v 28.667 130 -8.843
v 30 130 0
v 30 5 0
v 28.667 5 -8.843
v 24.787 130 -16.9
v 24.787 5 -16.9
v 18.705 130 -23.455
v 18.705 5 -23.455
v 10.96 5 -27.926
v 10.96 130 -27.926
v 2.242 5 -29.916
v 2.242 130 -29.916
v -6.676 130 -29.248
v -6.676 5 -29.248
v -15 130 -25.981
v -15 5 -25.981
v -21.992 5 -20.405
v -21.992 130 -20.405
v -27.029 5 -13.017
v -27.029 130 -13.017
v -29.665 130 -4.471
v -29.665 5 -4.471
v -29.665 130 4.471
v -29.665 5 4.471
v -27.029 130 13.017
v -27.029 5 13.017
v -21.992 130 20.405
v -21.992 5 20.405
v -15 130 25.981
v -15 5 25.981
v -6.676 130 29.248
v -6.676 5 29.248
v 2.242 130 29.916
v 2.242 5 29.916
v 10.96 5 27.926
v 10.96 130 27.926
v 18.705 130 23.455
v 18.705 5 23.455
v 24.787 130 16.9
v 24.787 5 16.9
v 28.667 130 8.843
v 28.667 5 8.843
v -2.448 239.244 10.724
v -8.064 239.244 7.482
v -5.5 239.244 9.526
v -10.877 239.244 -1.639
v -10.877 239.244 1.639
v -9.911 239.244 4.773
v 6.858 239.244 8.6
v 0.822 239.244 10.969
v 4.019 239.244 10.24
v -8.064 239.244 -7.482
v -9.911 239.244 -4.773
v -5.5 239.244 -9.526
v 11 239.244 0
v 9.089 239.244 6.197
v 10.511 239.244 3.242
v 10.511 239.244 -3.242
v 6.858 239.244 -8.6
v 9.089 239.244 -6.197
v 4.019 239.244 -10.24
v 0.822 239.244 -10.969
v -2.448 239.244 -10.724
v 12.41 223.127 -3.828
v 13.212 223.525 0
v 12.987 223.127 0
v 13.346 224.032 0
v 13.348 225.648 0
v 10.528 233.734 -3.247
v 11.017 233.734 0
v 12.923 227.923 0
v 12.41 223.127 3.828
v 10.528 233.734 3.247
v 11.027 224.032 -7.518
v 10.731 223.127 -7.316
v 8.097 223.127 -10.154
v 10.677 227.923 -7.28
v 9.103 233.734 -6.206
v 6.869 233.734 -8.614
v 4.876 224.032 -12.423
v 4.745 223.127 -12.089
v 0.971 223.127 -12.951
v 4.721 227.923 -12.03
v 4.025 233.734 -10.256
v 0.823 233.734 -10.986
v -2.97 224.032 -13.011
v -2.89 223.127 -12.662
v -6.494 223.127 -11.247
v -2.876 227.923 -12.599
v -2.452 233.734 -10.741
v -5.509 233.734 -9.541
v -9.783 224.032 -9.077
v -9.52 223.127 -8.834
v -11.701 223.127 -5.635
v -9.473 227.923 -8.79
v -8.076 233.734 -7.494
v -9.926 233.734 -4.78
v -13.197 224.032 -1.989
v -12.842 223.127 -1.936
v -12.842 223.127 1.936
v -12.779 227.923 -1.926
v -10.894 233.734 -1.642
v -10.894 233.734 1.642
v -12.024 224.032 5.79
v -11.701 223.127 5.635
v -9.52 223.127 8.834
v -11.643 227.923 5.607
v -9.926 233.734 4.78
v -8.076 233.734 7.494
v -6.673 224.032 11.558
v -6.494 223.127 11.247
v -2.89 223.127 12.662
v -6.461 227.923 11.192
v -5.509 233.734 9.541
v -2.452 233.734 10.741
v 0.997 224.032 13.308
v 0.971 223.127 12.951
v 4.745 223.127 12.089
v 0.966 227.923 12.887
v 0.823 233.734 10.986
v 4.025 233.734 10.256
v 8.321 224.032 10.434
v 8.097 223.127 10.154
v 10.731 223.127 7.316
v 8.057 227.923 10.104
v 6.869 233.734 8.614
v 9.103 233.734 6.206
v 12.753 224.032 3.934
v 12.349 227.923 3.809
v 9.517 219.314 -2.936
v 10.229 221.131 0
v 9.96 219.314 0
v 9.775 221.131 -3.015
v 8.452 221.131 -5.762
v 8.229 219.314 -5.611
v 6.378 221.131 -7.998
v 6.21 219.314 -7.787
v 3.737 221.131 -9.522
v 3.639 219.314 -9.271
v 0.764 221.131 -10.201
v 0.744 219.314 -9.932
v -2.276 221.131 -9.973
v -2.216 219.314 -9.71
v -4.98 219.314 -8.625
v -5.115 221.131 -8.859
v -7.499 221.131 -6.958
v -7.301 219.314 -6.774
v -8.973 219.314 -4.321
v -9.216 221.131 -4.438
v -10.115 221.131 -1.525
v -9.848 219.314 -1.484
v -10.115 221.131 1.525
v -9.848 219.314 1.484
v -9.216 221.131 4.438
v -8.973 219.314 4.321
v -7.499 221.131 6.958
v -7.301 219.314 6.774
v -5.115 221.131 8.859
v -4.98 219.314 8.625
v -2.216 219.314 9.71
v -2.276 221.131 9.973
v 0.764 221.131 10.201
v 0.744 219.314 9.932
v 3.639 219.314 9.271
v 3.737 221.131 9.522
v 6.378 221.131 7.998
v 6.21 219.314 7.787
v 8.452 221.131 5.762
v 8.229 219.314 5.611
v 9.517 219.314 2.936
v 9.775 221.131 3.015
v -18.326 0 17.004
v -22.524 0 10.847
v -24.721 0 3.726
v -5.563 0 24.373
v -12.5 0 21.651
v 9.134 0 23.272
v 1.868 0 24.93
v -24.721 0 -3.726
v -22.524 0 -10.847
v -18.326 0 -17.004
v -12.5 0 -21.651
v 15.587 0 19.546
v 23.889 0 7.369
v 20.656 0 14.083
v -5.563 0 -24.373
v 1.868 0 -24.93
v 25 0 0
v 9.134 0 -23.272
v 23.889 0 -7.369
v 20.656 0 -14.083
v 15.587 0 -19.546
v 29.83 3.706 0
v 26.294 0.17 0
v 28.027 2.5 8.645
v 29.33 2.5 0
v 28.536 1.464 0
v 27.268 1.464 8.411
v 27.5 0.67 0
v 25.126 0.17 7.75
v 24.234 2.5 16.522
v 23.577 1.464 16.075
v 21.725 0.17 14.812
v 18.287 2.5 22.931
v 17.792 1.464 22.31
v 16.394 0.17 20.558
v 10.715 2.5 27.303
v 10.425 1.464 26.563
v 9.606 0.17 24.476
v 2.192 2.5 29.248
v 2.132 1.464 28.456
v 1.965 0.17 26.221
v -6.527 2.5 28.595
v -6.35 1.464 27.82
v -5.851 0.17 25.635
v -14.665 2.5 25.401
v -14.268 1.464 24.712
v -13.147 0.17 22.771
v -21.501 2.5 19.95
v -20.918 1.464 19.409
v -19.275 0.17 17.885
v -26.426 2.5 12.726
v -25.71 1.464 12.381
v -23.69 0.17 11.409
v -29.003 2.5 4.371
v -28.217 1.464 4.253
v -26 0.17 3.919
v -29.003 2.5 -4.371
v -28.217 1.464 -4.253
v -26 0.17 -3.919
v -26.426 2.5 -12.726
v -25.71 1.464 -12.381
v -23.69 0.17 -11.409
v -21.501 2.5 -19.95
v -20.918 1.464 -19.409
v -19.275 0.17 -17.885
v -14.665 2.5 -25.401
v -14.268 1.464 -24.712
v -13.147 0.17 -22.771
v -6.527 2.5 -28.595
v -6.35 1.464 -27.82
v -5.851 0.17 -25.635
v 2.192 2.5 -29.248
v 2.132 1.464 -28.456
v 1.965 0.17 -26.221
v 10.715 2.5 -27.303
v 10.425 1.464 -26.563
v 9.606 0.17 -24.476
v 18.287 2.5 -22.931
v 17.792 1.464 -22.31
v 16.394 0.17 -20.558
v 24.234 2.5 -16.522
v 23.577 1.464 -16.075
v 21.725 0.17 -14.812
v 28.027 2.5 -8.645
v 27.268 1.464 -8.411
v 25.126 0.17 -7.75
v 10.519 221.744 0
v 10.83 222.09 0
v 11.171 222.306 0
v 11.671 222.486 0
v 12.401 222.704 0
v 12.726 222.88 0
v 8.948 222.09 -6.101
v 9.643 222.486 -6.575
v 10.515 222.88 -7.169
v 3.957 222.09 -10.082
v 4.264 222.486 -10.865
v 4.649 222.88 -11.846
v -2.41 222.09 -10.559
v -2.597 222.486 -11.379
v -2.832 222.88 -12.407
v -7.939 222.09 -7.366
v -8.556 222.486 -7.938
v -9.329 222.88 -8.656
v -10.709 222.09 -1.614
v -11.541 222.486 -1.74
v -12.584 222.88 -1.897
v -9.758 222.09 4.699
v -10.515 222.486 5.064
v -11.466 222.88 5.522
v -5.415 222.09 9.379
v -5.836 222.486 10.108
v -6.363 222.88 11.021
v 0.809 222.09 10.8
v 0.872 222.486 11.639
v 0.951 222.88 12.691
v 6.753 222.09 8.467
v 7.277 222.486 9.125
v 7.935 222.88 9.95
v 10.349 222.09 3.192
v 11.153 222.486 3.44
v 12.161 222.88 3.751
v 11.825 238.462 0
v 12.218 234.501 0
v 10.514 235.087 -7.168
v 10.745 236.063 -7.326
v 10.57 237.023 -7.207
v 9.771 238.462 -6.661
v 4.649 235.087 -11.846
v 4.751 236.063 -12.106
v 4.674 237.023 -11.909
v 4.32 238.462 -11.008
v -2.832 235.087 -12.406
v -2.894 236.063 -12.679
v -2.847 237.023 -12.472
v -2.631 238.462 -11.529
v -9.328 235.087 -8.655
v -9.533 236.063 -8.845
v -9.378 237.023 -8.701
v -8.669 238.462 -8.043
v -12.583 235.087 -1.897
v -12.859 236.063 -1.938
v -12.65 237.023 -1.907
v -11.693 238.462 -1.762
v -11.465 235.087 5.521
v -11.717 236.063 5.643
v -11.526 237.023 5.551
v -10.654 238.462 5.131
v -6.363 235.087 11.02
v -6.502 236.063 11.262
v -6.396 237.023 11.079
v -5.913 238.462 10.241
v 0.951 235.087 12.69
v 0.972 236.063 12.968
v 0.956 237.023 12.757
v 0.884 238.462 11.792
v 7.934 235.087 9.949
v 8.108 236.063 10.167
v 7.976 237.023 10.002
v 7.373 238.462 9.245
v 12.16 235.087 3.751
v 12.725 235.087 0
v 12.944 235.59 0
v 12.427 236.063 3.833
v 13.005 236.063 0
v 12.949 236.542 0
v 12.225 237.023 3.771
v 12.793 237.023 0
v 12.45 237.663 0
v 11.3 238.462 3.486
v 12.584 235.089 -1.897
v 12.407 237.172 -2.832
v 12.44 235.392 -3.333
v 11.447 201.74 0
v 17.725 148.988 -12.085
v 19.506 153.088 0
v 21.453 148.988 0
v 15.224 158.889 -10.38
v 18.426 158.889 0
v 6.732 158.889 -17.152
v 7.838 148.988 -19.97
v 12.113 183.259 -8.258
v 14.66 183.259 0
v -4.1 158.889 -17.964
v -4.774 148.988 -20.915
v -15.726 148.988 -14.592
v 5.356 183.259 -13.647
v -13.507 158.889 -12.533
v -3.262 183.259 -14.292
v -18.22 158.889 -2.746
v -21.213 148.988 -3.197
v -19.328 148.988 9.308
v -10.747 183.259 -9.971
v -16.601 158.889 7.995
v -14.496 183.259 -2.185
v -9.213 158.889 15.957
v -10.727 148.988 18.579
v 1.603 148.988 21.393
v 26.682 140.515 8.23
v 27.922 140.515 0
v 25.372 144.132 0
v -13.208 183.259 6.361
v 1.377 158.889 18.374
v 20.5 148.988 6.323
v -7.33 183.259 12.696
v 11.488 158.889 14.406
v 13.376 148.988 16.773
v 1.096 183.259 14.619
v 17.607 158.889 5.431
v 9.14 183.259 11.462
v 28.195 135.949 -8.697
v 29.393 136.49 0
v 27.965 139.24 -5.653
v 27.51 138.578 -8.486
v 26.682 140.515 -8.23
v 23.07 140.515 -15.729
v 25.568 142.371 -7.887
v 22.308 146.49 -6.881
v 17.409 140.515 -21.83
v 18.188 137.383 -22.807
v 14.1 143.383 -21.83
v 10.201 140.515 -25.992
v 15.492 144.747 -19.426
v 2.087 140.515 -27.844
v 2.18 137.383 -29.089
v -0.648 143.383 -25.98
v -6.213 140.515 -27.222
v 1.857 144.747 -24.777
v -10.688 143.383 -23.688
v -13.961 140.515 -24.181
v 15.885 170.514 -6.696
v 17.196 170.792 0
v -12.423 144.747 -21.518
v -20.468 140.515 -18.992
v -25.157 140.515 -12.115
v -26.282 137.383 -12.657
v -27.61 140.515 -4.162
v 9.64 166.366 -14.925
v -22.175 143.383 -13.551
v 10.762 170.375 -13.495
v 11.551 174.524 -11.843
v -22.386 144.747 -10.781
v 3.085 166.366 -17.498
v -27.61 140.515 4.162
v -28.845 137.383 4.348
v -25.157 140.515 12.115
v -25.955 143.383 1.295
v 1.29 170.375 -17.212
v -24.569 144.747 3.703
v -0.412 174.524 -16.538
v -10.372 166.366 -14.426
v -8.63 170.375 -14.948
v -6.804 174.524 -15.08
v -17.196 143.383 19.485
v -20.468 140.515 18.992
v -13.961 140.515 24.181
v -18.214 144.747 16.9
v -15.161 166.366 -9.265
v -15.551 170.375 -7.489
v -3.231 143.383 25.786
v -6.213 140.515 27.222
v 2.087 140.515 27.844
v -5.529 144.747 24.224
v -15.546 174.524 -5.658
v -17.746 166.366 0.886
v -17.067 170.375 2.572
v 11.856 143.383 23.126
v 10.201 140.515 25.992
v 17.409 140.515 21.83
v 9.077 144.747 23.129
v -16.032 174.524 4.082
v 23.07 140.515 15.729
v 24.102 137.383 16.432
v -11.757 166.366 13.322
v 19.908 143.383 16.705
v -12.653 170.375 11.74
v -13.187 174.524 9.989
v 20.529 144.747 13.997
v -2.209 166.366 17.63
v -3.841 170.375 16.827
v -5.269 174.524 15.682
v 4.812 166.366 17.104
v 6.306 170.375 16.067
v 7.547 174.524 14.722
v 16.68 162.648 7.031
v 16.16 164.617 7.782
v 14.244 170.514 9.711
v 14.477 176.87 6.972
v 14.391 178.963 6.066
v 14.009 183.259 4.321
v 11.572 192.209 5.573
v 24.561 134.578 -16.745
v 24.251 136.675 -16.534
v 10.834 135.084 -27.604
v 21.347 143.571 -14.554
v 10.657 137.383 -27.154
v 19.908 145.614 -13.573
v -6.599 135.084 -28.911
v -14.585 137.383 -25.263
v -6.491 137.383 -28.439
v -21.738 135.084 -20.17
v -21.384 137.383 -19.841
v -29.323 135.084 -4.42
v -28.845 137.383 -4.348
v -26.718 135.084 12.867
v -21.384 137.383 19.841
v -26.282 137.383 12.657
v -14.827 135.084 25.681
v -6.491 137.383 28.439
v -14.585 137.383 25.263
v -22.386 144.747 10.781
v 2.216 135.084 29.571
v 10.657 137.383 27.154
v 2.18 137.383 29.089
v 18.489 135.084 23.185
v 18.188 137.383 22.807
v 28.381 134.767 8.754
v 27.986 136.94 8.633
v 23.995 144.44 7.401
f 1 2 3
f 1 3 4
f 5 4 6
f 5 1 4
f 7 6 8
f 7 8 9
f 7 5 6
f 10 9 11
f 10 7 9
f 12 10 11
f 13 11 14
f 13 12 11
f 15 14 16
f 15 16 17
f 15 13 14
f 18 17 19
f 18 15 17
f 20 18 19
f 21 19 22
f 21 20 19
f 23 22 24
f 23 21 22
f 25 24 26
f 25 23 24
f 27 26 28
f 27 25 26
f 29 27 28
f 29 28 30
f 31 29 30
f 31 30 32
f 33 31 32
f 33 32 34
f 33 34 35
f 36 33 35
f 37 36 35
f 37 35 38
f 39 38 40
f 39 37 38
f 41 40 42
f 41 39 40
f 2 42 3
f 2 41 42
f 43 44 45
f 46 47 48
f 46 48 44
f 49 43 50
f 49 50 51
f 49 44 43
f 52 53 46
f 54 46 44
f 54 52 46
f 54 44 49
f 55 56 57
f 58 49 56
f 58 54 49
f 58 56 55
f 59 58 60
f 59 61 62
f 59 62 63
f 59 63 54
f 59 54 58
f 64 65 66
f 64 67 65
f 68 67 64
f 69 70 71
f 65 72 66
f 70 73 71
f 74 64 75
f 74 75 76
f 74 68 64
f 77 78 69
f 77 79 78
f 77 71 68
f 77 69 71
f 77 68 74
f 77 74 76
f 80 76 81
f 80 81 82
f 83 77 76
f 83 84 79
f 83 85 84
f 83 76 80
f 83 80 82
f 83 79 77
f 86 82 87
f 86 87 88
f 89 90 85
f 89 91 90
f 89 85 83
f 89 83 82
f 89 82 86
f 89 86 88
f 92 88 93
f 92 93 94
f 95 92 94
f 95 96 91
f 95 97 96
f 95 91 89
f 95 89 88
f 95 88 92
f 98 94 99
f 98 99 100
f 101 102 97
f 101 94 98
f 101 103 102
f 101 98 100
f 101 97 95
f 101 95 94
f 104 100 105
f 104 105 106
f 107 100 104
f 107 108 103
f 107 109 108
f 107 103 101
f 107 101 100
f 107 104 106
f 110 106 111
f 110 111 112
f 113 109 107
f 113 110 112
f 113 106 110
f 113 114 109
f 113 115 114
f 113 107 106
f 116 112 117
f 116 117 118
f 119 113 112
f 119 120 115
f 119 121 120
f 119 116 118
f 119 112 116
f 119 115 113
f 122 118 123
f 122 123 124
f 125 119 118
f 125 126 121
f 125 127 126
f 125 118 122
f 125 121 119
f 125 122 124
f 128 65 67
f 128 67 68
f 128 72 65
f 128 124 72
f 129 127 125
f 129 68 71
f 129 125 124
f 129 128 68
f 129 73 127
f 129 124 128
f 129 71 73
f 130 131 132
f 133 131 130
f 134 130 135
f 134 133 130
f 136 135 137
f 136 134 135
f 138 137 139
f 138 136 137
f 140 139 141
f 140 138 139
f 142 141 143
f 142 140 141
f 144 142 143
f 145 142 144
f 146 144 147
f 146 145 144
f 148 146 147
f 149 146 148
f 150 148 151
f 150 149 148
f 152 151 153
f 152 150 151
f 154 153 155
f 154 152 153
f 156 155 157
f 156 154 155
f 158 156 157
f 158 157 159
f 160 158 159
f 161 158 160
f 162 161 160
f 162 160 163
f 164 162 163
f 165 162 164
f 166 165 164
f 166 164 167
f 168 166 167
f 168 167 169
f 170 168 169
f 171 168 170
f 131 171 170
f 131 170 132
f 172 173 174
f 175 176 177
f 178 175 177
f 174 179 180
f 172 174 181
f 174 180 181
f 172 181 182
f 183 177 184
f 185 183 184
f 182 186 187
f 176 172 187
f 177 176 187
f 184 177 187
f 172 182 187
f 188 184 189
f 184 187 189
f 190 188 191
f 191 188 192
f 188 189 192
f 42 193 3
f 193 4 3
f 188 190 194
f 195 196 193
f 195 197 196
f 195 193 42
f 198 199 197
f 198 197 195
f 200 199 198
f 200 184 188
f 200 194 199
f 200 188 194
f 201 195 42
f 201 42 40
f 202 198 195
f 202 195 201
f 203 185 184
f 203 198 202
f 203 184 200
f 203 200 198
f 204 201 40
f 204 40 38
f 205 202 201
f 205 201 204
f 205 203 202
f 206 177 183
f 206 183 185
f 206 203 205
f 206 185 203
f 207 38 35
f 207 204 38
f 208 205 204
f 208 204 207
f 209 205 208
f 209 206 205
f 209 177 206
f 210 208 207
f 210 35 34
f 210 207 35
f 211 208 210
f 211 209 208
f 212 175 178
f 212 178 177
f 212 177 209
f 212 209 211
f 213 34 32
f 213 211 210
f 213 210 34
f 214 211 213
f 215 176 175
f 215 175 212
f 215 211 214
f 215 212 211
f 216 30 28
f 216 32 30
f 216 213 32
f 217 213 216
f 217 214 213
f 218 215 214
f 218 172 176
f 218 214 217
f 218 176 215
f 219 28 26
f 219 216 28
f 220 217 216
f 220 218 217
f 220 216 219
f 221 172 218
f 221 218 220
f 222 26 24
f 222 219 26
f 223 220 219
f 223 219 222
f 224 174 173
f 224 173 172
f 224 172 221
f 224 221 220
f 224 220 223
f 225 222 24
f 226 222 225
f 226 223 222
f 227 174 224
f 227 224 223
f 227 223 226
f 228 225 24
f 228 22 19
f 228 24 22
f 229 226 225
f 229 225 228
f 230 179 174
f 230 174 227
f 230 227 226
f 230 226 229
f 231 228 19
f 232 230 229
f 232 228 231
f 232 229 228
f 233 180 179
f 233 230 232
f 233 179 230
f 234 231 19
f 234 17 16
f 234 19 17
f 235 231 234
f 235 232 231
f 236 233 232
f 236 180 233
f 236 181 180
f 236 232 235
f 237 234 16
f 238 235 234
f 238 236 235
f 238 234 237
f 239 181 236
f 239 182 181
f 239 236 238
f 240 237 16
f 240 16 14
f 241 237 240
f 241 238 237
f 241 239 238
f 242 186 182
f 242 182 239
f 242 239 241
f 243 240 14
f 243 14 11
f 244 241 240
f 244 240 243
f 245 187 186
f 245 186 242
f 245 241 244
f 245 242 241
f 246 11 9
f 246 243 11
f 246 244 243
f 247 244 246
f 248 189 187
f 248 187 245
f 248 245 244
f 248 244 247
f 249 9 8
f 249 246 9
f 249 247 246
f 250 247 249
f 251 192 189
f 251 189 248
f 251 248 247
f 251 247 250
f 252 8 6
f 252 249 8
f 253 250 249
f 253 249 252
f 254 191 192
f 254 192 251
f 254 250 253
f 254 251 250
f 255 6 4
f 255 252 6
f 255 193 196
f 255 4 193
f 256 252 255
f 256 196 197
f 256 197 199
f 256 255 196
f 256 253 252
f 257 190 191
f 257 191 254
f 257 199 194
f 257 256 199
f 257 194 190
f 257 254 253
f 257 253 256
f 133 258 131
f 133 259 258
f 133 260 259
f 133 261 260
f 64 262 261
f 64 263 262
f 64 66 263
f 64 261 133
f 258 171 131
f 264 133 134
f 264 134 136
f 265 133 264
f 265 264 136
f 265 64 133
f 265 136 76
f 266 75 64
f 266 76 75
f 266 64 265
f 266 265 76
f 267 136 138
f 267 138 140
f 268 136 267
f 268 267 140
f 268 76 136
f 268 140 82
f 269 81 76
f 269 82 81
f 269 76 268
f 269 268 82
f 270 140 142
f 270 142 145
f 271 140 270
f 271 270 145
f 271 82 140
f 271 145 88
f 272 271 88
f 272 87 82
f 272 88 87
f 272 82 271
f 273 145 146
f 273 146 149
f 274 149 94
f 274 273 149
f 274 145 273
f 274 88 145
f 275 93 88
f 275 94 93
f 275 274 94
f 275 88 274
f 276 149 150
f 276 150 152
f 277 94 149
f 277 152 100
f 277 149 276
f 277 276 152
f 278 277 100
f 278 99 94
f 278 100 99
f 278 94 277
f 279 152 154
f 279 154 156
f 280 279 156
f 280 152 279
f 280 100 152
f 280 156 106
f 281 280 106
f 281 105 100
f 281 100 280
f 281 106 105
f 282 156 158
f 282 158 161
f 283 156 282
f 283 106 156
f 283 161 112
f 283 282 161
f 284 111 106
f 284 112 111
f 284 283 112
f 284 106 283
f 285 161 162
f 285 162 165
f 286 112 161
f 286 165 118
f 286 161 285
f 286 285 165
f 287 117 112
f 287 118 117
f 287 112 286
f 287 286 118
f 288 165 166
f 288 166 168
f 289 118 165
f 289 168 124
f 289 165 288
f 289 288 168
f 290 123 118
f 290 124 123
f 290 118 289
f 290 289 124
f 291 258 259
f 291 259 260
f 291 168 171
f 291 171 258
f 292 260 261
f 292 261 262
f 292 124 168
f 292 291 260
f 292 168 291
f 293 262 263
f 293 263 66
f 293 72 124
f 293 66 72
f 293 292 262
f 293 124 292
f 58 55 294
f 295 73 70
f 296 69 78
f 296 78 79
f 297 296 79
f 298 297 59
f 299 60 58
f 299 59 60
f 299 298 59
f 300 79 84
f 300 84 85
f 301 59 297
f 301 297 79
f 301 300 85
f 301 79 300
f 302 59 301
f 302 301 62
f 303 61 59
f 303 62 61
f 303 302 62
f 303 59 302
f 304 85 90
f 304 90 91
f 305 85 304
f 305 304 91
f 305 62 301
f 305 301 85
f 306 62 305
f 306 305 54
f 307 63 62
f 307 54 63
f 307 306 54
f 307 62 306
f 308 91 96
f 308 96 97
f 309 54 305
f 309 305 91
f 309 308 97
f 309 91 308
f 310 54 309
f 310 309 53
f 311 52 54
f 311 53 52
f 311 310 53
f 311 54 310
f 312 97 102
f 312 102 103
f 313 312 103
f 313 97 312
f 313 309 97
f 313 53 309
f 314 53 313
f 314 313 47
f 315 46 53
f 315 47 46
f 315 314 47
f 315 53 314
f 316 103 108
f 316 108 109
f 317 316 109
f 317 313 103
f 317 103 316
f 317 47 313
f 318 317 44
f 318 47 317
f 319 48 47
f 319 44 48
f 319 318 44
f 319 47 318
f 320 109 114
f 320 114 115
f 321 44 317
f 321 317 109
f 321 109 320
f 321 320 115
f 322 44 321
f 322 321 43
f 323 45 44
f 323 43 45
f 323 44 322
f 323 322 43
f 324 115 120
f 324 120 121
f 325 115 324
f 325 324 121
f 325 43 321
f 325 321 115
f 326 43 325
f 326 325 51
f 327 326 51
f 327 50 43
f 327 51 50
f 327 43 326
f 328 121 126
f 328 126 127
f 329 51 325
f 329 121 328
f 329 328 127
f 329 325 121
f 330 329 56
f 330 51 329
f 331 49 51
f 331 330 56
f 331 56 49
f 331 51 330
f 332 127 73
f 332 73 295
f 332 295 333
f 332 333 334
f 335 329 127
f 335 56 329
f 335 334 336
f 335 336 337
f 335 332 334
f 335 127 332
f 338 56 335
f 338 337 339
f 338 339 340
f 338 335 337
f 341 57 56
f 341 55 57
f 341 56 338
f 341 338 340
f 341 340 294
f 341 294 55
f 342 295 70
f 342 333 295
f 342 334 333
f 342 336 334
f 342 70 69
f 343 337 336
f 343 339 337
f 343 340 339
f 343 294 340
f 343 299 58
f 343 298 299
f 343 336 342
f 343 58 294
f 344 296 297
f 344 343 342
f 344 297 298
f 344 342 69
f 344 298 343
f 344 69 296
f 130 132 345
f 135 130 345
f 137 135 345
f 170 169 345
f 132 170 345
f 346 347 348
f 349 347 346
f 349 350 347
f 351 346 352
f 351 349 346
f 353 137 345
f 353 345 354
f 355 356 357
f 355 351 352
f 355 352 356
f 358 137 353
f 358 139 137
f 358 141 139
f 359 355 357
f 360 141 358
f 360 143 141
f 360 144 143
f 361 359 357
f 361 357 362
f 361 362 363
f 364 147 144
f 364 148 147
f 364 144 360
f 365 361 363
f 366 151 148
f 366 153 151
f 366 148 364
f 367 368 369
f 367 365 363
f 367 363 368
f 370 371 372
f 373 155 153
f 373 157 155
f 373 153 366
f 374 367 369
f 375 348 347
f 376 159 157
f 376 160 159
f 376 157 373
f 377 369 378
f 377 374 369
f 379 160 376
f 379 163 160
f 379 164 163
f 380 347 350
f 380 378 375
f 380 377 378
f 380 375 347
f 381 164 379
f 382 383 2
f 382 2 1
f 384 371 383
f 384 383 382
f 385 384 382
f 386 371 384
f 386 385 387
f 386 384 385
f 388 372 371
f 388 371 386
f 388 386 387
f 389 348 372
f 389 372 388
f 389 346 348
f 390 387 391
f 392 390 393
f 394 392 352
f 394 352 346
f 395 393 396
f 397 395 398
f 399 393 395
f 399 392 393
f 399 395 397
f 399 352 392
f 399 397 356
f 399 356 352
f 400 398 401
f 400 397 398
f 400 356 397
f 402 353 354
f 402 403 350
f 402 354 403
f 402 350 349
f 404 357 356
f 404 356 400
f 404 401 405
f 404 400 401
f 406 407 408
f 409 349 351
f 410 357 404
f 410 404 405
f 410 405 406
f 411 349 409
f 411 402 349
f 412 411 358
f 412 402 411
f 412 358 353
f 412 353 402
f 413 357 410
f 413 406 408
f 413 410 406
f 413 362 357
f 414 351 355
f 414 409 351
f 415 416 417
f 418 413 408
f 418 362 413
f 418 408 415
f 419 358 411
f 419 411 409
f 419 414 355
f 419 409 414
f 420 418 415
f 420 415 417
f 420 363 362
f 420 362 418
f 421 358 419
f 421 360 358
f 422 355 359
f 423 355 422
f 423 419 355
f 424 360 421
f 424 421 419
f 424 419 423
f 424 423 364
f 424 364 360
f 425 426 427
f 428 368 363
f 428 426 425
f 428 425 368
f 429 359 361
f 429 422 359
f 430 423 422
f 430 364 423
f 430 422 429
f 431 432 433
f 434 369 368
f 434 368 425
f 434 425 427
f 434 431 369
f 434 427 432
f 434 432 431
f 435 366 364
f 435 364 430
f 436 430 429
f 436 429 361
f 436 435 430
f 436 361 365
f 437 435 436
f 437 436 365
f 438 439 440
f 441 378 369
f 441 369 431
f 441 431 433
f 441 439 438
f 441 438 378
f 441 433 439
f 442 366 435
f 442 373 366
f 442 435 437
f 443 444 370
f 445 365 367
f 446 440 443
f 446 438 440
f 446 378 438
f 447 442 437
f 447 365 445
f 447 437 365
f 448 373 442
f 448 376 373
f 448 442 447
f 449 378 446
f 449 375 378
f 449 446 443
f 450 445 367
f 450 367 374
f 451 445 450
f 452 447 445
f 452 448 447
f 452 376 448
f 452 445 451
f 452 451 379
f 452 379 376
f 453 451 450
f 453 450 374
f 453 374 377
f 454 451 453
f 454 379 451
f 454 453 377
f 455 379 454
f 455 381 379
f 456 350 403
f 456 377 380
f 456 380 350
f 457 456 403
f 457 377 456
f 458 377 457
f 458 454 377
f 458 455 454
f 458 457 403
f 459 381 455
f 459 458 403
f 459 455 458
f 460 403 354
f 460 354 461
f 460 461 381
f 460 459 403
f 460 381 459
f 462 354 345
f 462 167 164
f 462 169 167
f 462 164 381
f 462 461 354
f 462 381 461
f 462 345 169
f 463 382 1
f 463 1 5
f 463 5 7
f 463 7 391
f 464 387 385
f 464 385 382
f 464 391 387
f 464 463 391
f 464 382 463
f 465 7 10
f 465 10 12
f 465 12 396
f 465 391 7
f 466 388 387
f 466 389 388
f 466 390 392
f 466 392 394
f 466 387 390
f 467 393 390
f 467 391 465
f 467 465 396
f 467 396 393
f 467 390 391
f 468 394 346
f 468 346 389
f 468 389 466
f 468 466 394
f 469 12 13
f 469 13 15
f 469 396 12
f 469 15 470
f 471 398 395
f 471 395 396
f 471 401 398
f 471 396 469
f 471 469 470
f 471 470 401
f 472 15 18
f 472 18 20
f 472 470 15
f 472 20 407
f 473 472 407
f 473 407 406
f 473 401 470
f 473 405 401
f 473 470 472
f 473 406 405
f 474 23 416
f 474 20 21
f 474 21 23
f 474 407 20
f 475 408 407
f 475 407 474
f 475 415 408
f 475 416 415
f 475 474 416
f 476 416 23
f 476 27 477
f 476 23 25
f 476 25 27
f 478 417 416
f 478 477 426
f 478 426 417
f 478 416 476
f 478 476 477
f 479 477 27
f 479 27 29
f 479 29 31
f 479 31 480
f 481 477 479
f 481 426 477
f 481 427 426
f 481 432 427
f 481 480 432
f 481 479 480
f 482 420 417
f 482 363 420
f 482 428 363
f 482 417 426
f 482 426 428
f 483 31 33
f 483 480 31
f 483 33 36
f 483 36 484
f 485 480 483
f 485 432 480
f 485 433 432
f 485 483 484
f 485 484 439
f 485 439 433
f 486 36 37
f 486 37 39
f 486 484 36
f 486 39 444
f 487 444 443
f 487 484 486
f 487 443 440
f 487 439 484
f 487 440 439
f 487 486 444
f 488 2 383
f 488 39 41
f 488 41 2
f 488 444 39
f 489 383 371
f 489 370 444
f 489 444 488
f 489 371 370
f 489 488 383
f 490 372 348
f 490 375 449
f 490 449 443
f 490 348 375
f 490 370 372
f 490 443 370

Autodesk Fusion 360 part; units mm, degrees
sketch "Sketch1" plane through (0, 0, 0) normal (0, 0, 1) x (1, 0, 0) in component "Bottle"
  line L0 (0, 0) -> (0, 240)
  line L1 (0, 0) -> (30, 0)
  line L2 (30, 0) -> (30, 130)
  spline S0 degree 5 poles (30, 130) (29.998, 130.5867) (29.9763, 131.7424) (29.891, 133.4228) (29.6561, 135.5533) (29.0844, 138.0165) (28.1655, 140.2736) (26.8747, 142.3415) (25.2854, 144.28) (23.5656, 146.1888) (21.9148, 148.1805) (20.5169, 150.3601) (19.4863, 152.8016) (18.8176, 155.5265) (18.4238, 158.5188) (18.171, 161.7388) (17.9157, 165.1381) (17.5383, 168.6723) (16.9848, 172.3181) (16.2605, 176.0711) (15.4096, 179.938) (14.4998, 183.9314) (13.6047, 188.0637) (12.7875, 192.3401) (12.0839, 196.7543) (11.4848, 201.279) (10.9562, 205.858) (10.4853, 210.3683) (10.0776, 214.649) (9.8642, 218.3732) (9.9543, 221.2857) (10.8878, 222.5808) (12.5552, 222.4718) (13.3816, 223.3082) (13.5145, 224.987) (13.1496, 227.29) (12.5016, 229.5972) (11.8316, 231.5704) (11.3023, 232.9949) (11.0171, 233.7344) knots 0 0 0 0 0 0 0.028571 0.057143 0.085714 0.114286 0.142857 0.171429 0.2 0.228571 0.257143 0.285714 0.314286 0.342857 0.371429 0.4 0.428571 0.457143 0.485714 0.514286 0.542857 0.571429 0.6 0.628571 0.657143 0.685714 0.714286 0.742857 0.771429 0.8 0.828571 0.857143 0.885714 0.914286 0.942857 0.971429 1 1 1 1 1 1
  line L3 (30.0435, 117.5044) -> (29.9565, 142.4956)
  line L4 (8.2601, 215.0919) -> (12.1986, 227.1701)
  line L5 (9.449, 218.6711) -> (16.5255, 227.5827)
  spline S1 degree 5 poles (11.0171, 233.7344) (11.4206, 233.9324) (12.1146, 234.3372) (12.817, 234.9704) (13.1658, 235.858) (12.9204, 237.0026) (12.3468, 237.9168) (11.742, 238.5879) (11.2604, 239.0266) (11, 239.2438) knots 0 0 0 0 0 0 0.2 0.4 0.6 0.8 1 1 1 1 1 1
  line L6 (11.4748, 238.8477) -> (10.5252, 239.6399)
  line L7 (10.3402, 233.4022) -> (11.6939, 234.0666)
  line L8 (11, 239.2438) -> (0, 239.2438)
  point P0 (27.4621, 141.314)
  point P1 (20.6353, 150.3726)
  point P2 (17.8039, 166.0148)
  point P3 (12.7238, 192.9048)
  point P4 (10.2294, 221.131)
  point P5 (12.9872, 223.1269)
  dimension "d1" = 240
  dimension "d2" = 30
  dimension "d3" = 130
  dimension "d7" = 11
revolve "Revolve1" add sketch "Sketch1" angle 360 about axis through (0, 0, 0) along (0, 1, 0) contours L0 L1 L2 S0 S1 L8 in component "Bottle"
fillet "Fillet1" radius 5 1 edges at (-27.9698, 0, -10.8485) in component "Bottle"
shell "Shell1" thickness 2.5 removed faces 1 at (2.9076, 239.2438, 1.5312) in component "Bottle"
component "Bottle" placed x (1, 0, 0) y (0, 1, 0) z (0, 0, 1) at (0, 0, 0)
